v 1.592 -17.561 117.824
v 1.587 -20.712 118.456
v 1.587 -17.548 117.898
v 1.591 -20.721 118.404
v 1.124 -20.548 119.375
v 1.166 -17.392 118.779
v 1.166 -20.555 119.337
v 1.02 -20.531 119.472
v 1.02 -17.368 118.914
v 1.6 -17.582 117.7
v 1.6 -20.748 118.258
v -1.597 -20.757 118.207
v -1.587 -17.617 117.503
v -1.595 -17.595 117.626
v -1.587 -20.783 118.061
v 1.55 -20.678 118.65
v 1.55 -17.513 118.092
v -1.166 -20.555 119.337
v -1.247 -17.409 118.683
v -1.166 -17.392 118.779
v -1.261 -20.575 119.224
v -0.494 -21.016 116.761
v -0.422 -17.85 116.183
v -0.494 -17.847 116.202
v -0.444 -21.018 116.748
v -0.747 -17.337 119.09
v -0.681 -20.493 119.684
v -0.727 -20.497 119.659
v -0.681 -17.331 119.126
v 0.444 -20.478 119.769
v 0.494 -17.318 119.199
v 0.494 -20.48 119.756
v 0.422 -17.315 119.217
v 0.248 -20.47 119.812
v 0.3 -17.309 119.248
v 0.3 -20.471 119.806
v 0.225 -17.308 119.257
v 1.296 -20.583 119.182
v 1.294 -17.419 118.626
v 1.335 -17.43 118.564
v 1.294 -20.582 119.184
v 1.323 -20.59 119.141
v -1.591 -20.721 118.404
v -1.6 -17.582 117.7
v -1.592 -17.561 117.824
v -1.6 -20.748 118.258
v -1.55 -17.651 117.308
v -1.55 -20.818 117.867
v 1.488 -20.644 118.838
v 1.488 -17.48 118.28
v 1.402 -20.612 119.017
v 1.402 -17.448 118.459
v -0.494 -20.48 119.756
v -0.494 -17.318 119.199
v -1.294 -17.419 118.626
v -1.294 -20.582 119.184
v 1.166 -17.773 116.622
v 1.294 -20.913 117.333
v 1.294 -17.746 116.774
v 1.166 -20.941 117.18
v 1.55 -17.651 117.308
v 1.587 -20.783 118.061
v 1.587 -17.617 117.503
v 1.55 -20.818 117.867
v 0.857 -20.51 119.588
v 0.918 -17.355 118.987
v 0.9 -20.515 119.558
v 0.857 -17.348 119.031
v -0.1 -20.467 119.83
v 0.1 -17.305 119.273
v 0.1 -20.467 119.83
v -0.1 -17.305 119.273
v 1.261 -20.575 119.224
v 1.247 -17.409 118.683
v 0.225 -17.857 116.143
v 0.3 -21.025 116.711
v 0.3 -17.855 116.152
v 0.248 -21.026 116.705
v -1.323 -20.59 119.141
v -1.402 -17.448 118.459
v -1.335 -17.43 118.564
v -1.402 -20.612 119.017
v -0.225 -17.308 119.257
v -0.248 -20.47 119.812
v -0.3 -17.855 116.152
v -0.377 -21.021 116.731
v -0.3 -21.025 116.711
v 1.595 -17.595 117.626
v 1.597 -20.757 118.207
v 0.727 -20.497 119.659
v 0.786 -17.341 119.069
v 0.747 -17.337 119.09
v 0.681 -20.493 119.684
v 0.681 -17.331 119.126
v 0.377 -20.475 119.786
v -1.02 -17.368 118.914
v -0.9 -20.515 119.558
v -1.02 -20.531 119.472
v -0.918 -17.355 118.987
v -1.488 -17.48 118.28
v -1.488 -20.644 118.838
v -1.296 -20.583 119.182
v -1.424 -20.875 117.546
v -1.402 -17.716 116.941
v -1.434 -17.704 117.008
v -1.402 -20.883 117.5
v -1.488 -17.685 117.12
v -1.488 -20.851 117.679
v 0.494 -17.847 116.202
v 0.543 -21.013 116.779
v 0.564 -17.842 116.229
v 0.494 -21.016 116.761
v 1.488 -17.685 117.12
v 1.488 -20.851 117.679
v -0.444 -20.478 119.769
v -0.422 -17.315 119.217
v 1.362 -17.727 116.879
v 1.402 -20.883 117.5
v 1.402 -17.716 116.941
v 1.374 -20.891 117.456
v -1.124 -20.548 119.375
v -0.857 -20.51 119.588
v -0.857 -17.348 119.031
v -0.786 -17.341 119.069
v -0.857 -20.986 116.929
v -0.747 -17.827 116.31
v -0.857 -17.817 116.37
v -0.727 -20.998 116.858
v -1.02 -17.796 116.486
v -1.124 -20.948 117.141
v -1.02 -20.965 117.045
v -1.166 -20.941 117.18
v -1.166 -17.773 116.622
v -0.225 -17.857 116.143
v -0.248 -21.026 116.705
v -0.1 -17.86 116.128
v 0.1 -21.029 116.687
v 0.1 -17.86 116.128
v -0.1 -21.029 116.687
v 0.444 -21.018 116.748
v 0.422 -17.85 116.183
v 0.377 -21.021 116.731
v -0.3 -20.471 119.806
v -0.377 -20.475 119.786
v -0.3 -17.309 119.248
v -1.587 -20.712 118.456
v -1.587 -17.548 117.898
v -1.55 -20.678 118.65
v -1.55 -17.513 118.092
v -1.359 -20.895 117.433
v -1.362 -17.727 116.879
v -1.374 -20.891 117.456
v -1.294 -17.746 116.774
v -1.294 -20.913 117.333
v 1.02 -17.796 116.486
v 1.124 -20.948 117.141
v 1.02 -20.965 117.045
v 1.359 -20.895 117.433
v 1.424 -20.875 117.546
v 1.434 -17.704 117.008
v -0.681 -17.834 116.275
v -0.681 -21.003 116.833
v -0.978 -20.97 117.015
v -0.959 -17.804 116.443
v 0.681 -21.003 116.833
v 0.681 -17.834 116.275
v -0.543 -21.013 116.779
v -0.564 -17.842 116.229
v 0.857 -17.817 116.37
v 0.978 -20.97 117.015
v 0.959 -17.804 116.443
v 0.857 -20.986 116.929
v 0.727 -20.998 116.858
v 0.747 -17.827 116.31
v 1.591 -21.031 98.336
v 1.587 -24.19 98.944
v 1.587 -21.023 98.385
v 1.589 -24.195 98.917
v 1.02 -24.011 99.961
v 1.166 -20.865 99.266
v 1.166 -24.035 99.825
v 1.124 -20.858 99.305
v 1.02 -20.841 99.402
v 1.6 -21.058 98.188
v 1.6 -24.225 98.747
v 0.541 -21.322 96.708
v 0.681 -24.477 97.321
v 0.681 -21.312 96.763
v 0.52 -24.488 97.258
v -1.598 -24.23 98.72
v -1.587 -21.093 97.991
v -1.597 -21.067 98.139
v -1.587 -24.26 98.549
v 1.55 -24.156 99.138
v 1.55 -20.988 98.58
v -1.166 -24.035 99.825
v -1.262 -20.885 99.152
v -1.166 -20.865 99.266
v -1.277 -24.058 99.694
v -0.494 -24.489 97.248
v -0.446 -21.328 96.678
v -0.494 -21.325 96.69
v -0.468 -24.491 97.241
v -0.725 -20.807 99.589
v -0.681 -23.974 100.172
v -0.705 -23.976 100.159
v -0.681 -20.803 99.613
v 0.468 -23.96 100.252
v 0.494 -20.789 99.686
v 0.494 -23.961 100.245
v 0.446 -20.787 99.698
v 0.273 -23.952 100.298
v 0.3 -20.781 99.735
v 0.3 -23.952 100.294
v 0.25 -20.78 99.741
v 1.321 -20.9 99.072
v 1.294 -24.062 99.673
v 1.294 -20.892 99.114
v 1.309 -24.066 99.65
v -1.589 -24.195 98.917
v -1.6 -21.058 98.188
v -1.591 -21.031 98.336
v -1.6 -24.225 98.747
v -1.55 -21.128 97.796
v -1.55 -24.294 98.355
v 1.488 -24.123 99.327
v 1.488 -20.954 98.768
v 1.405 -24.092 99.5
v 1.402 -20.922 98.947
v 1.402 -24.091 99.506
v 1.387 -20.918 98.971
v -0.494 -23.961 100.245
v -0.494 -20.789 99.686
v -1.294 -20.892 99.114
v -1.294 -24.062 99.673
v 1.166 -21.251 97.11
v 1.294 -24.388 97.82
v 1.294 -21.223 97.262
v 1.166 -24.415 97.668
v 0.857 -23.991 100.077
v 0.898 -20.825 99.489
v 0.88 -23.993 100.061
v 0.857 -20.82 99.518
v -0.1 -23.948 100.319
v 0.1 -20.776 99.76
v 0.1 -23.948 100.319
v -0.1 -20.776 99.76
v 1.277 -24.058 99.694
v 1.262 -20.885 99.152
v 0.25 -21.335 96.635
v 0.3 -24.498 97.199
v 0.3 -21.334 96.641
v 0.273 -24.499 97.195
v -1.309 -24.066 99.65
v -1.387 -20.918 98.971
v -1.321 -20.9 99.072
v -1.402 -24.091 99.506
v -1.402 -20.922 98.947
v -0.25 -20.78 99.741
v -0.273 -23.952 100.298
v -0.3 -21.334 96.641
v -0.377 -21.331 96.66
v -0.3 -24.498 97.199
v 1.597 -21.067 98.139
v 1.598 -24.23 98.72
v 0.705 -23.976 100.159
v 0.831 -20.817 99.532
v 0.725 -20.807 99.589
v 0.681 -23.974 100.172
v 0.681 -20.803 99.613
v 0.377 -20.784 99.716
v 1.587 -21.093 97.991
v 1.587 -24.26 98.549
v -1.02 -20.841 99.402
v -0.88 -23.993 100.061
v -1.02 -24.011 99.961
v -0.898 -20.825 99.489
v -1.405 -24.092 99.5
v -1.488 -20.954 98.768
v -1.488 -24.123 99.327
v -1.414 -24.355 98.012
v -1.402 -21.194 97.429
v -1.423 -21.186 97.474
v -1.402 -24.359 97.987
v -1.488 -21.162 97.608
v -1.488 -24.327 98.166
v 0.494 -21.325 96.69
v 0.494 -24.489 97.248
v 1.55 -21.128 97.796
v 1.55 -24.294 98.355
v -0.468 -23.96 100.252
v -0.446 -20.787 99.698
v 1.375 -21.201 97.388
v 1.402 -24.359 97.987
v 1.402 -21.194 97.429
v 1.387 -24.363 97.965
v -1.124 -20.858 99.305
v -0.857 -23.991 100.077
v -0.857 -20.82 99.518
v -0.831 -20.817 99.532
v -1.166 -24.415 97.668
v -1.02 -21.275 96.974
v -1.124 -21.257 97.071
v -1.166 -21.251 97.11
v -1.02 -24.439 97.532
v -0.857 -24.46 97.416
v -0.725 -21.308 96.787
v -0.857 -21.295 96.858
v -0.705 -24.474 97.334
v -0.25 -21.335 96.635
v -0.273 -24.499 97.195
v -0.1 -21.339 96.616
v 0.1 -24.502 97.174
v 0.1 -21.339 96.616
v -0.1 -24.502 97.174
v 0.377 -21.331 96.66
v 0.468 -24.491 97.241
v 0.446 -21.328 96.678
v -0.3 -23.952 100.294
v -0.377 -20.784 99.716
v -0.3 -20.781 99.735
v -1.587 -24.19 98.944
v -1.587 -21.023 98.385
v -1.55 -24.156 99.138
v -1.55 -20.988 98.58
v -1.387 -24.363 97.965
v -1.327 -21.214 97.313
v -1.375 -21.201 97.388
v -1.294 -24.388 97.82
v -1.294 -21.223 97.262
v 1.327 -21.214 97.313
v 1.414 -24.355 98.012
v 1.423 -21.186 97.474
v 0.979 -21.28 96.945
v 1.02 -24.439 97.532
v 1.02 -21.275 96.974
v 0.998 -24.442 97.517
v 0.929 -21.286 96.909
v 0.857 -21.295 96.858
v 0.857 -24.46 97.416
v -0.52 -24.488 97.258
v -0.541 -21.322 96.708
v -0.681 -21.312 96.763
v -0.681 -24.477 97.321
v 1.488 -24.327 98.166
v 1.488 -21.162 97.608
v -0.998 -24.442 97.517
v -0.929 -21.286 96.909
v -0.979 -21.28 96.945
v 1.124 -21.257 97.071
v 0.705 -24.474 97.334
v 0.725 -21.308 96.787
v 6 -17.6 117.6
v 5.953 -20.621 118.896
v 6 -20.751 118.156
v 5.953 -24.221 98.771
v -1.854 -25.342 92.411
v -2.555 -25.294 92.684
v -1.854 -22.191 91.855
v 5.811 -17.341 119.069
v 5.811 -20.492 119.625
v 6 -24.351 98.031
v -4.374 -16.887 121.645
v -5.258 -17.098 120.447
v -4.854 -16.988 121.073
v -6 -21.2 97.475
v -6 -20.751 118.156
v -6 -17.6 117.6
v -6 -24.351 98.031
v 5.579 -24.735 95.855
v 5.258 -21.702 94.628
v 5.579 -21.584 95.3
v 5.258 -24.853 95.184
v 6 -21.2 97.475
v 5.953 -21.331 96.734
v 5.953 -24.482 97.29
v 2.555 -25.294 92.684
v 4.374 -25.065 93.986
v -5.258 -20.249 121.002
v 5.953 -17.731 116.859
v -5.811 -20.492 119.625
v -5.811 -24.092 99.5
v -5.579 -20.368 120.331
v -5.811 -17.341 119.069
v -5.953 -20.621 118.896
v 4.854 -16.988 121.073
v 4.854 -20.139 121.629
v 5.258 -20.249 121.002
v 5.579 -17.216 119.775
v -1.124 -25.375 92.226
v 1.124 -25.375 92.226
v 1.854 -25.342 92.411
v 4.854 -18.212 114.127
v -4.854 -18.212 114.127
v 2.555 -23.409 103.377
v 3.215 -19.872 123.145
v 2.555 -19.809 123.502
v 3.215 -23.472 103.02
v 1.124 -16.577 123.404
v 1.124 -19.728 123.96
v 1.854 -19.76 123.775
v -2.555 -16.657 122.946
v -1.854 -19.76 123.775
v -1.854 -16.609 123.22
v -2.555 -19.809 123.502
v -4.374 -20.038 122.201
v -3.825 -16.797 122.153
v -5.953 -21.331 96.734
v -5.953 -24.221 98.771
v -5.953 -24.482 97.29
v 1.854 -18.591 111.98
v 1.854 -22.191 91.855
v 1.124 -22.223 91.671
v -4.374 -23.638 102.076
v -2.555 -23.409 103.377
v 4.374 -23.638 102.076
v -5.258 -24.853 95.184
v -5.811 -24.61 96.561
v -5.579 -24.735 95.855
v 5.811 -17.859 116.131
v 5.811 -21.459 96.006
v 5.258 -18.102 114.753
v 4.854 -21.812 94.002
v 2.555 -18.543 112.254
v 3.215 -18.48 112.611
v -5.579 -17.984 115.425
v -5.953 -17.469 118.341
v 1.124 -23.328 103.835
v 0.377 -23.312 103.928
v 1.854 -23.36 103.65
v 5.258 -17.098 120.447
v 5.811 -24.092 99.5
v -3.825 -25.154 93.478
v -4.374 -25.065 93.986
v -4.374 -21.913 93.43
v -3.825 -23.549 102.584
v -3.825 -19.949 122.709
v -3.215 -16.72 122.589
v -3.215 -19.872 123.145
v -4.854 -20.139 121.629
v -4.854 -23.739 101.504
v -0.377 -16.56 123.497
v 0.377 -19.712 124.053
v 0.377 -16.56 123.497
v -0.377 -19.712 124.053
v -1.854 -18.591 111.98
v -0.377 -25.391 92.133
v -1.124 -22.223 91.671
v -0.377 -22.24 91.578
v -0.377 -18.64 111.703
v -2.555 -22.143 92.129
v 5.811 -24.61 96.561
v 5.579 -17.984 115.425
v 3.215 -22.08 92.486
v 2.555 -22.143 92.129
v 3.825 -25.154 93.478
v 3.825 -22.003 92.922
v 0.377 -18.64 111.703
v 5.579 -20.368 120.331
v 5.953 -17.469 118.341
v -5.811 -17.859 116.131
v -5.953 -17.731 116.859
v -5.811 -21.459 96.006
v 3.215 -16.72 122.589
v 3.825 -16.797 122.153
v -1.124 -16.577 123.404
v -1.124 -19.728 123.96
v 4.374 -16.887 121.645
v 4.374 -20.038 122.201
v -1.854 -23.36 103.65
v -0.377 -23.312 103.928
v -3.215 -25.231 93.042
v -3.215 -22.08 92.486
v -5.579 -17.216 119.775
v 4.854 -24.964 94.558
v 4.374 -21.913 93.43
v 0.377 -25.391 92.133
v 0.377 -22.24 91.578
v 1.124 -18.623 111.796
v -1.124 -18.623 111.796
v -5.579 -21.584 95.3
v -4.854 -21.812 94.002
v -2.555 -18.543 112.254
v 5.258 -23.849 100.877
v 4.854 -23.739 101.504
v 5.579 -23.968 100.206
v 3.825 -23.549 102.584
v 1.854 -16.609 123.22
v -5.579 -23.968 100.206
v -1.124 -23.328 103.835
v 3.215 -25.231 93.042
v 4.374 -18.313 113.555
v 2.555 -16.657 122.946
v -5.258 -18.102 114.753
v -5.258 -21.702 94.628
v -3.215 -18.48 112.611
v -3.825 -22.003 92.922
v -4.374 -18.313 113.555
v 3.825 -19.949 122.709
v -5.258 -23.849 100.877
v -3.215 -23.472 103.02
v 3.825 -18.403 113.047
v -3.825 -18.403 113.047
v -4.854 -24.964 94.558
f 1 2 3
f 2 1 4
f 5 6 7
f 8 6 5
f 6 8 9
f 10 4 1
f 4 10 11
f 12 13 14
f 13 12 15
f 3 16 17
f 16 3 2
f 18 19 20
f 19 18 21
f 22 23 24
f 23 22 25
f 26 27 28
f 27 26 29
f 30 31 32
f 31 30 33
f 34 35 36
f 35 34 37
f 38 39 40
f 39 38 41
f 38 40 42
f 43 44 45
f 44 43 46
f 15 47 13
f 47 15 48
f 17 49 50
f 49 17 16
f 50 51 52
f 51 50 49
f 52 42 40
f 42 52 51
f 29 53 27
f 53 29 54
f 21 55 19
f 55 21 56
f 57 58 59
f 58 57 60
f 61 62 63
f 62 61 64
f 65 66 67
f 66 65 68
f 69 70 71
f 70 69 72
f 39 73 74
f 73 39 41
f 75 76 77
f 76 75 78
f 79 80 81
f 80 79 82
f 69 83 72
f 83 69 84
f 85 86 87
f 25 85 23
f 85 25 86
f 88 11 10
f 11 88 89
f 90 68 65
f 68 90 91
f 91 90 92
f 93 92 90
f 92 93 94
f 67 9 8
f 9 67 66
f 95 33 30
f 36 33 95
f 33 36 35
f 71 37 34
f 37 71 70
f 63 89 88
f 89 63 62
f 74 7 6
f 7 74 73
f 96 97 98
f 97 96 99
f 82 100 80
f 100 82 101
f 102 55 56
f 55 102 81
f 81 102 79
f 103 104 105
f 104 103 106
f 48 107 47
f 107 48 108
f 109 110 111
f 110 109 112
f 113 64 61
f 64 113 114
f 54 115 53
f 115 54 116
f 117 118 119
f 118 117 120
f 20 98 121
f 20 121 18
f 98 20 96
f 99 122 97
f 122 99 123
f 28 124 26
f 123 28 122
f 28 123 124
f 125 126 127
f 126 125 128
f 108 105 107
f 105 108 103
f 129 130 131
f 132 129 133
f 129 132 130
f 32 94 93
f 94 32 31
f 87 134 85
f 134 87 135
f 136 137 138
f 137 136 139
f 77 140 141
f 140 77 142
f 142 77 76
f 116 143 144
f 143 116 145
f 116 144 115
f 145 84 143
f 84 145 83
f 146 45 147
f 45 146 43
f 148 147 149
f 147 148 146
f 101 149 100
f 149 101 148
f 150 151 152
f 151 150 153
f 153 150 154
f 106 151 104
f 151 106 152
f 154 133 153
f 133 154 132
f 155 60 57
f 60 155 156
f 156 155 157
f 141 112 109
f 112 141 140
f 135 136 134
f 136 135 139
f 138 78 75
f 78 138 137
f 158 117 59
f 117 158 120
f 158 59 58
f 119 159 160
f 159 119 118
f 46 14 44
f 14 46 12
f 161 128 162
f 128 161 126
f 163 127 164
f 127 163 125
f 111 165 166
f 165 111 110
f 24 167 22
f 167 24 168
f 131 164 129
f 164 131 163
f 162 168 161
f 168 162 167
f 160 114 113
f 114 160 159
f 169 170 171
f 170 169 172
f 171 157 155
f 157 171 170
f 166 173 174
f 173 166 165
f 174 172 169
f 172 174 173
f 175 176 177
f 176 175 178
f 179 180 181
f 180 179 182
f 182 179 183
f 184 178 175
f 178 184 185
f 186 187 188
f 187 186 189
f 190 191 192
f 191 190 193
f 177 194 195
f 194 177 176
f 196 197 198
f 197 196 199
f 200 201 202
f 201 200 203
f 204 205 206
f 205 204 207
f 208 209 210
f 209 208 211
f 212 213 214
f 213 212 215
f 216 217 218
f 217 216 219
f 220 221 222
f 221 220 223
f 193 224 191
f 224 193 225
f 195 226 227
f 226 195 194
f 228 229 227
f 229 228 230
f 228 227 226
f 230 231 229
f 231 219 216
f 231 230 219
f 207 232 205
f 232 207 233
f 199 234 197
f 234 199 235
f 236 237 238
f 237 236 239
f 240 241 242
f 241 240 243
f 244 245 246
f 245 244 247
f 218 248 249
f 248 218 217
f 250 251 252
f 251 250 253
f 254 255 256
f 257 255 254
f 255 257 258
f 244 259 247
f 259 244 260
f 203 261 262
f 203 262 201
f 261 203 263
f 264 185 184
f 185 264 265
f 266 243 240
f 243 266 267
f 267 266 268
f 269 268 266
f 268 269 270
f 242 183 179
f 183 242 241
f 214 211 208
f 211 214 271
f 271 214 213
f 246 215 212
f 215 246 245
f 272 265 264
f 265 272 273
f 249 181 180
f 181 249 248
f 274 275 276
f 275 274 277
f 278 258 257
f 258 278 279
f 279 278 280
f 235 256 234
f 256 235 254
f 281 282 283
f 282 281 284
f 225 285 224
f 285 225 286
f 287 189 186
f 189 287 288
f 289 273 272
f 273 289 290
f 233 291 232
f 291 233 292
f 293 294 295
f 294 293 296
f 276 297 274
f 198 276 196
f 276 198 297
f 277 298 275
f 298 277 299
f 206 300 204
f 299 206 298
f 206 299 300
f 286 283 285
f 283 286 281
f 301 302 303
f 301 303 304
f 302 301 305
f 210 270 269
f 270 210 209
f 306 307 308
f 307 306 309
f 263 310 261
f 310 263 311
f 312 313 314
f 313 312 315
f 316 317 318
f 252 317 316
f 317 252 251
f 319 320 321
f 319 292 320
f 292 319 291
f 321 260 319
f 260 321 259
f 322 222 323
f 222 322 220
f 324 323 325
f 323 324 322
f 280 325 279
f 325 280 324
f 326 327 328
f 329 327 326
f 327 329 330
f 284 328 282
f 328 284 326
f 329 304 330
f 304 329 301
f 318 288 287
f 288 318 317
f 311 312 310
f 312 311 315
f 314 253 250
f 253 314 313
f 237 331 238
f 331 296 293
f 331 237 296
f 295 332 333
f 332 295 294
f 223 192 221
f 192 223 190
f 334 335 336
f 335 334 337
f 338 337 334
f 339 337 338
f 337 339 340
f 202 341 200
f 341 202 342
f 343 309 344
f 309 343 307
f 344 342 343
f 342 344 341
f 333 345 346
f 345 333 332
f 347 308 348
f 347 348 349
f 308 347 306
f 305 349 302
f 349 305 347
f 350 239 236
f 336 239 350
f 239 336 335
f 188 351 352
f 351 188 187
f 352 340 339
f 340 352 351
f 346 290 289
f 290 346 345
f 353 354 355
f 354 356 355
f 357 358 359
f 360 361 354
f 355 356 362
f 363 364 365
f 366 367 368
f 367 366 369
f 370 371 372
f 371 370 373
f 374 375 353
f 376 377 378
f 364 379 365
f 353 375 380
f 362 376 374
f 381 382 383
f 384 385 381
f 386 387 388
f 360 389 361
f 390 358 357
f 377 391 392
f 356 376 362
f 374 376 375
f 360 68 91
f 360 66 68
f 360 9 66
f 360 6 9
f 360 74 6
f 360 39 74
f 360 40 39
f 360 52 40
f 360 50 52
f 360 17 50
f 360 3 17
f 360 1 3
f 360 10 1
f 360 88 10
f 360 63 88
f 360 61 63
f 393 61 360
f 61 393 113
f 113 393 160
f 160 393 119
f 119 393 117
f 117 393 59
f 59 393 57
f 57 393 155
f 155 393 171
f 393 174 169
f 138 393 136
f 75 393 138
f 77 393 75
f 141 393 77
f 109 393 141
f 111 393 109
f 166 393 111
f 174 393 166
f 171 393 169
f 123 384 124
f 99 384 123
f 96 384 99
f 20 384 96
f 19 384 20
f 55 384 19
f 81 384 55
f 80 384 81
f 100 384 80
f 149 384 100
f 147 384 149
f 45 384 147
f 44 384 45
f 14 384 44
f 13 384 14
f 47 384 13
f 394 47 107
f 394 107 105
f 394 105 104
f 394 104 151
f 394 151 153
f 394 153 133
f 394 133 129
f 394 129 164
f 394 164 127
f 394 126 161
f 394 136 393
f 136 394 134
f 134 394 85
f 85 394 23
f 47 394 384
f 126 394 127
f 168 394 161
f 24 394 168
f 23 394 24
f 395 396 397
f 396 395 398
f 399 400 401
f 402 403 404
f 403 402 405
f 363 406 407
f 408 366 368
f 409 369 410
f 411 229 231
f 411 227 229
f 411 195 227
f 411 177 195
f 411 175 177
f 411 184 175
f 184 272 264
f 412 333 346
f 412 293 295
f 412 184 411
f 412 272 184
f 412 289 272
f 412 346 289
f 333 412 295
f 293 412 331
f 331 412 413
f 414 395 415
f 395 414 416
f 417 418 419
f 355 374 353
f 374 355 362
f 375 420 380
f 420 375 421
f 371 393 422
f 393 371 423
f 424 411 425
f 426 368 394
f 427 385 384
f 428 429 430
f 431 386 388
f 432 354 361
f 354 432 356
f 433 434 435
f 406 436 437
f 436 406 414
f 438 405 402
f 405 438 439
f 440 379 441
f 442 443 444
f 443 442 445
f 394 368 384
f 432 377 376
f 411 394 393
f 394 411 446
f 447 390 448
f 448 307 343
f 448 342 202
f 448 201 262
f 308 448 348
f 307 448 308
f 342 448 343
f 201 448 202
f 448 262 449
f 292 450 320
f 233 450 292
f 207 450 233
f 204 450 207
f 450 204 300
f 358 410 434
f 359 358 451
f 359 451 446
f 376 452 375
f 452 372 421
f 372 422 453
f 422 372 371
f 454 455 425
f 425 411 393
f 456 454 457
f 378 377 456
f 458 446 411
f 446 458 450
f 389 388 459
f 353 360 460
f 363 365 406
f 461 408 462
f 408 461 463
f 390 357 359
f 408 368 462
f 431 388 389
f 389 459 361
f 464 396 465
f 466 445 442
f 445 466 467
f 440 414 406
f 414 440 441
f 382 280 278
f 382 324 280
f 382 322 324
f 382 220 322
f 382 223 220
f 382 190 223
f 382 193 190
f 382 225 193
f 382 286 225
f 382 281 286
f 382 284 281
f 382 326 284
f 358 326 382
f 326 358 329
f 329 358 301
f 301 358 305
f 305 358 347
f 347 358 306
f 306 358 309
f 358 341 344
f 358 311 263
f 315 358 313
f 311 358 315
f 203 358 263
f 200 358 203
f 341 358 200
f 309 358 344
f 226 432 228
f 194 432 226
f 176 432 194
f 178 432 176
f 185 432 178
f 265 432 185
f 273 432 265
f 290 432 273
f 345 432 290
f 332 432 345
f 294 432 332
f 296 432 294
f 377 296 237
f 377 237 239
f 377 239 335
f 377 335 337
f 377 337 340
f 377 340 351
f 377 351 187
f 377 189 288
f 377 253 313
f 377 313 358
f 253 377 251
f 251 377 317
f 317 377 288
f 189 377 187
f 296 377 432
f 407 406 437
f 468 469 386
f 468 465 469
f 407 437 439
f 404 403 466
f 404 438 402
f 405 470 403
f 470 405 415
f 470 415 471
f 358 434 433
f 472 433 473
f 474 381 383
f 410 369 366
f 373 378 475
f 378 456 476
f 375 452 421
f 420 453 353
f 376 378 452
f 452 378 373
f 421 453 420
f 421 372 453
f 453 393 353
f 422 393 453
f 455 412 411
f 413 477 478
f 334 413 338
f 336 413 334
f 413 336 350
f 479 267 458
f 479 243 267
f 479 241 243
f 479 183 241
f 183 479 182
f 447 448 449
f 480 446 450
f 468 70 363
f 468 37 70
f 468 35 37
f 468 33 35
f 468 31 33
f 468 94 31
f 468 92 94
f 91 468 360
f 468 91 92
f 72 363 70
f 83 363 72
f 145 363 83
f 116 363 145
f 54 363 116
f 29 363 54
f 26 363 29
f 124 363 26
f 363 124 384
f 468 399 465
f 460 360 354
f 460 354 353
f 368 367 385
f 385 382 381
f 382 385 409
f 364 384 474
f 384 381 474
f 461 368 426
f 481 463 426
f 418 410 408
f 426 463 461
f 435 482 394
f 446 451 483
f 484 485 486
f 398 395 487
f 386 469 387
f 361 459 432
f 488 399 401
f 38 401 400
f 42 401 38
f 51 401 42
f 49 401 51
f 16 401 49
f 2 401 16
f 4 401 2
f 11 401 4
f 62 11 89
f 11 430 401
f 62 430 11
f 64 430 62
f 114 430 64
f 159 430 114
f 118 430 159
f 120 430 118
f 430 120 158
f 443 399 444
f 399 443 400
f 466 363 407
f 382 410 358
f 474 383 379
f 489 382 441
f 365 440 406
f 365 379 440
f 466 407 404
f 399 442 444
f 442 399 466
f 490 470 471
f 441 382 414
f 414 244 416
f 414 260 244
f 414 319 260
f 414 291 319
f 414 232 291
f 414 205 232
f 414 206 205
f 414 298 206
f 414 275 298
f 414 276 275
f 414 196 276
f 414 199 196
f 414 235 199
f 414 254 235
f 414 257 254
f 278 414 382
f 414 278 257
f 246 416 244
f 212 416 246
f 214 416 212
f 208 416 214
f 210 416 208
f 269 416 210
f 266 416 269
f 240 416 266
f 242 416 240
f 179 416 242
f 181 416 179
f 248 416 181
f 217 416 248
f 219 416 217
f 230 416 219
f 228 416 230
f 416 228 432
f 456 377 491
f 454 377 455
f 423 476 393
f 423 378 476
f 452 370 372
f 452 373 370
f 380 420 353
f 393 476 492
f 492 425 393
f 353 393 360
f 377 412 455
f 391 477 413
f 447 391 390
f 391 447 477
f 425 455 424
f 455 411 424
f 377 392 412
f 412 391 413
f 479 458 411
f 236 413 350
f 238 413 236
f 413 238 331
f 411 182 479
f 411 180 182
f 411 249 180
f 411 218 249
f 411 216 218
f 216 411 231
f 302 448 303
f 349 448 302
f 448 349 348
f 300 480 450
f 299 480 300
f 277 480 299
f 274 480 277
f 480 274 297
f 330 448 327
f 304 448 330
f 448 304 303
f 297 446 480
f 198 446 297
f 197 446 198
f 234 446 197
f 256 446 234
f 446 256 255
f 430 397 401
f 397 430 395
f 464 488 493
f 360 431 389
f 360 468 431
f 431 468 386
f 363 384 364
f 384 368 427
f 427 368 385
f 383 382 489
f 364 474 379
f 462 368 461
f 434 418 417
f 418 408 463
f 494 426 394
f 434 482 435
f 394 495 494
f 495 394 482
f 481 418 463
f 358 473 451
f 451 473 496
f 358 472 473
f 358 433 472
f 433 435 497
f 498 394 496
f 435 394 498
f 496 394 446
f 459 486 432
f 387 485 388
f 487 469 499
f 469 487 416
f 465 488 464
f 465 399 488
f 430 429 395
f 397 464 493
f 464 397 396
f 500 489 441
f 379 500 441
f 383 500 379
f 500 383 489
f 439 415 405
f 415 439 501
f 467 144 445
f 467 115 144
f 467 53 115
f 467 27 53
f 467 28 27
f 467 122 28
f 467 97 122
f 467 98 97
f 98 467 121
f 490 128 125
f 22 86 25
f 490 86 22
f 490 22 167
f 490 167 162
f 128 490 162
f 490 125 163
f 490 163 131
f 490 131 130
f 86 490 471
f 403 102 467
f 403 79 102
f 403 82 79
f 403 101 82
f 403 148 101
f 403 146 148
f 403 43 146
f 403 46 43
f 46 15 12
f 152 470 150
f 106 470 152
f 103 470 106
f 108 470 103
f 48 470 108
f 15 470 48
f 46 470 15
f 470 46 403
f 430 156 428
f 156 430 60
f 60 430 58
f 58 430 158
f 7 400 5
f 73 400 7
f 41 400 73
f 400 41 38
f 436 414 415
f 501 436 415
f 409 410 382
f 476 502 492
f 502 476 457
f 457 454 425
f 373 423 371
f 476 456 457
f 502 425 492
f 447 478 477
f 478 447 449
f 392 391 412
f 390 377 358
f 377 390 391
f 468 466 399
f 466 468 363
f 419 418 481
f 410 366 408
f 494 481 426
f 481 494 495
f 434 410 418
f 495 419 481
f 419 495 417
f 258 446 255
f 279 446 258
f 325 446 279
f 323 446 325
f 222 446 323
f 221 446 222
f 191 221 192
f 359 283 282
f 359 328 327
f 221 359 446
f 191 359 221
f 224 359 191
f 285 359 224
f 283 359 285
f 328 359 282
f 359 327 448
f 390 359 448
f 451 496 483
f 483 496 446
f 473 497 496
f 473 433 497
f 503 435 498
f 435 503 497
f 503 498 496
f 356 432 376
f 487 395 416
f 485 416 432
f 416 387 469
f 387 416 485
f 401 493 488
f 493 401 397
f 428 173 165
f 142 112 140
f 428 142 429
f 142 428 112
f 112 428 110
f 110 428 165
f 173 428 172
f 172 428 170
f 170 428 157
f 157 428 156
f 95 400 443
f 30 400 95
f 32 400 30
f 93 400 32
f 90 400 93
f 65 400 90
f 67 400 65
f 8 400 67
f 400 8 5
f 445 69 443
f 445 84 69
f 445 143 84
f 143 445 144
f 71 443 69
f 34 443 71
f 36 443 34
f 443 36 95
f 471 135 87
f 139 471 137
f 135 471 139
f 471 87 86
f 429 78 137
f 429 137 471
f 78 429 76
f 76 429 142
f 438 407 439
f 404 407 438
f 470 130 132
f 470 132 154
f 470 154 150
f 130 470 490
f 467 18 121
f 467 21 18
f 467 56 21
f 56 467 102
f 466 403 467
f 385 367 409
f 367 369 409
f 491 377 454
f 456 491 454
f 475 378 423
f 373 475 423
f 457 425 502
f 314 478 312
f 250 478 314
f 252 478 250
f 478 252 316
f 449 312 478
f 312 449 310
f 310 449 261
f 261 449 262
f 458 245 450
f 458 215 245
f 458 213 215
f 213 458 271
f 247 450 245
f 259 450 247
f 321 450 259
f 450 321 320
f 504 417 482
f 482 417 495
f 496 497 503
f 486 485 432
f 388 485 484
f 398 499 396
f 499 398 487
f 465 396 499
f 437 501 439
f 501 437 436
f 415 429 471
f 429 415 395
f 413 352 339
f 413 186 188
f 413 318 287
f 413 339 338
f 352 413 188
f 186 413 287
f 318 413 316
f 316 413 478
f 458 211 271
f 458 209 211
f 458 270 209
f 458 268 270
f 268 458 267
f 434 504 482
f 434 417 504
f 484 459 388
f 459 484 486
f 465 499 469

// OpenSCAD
// vim:ts=4:sw=4:sts=4:et:ai:si:fdm=marker
//
// Make the varla stone holey and add a square hole to the top through which we'll ram a 10x10mm
// square alu tube for LED mounting, cooling and cable housing.
//
// Written by Roy Sigurd Karlsbakk <roy@karlsbakk.net> in August 2025.
//

// Functions
function b2i(b) = b ? 1 : 0;

// Variables
holey = true;

frame_filename = "varla_frame_bottom-r2.obj";
stone_filename = "varla_stone_bottom.obj";

alutubedim = holey ? [10.5,10.5,200] : [0,0,0];
krymp = [.97,.97,.97];

draw_stone_bottom = false;
draw_frame_bottom = true;
draw_stone_top = false;
draw_frame_top = false;

stone_top_d = 28.5;
stone_top_mid_d = 40.5;
stone_bottom_mid_d = 66.5;
stone_bottom_d = 82.5;

stone_top_h = 130.25;
stone_top_mid_h = 90.0;
stone_bottom_mid_h = 28.75;
stone_screw1_z = stone_top_h - (stone_top_h - stone_top_mid_h) / 4;
stone_screw2_z = stone_top_h - (stone_top_h - stone_top_mid_h) / 4 * 3;

frame_top_h = holey ? 163.2 : 165.7;
frame_screw1_z = 114.6;
frame_screw2_z = frame_screw1_z - (stone_screw1_z - stone_screw2_z);
frame_hole_rot = 80;

screwplate_d = 12;
screwplate_th = 3.2;
screw_d = 3.2;

plug_h = 30;

thickness = 1;

bugfix = $preview ? .1 : 0;

debug = true;

// Sanity check
draw_count = b2i(draw_stone_bottom) + b2i(draw_frame_bottom) + b2i(draw_stone_top) + b2i(draw_frame_top);
assert(draw_count == 1, str("draw count is ", draw_count, " and it should be 1"));

// Debug
if (debug) {
    echo(str("DEBUG: stone_top_h is ", stone_top_h, ", stone_top_mid_h is ", stone_top_mid_h,
             ", stone_screw1_z is ", stone_screw1_z, " and stone_screw2_z is ", stone_screw2_z,
             ", frame_screw1_z is ", frame_screw1_z, " and frame_screw2_z is ", frame_screw2_z));
}

// Square tube
module square_tube(dim = alutubedim) {
    translate([-dim[0]/2,-dim[1]/2,0]) {
        cube(dim);
    }
}

// Stone first
module stone() {
    difference() {
        import(stone_filename);

        translate([0,0,-bugfix]) {
            scale(krymp) {
                translate([0,0,-5]) {
                    import(stone_filename);
                }
            }
        }
    }

    translate([0,0,stone_top_mid_h]) {
        color("red") {
            cylinder(d1=stone_top_mid_d, d2=stone_top_d, h=stone_top_h-stone_top_mid_h);
        }
    }
}

module holey_stone(screws = true) {
    difference() {
        stone();

        square_tube();

        // Screw holes
        if (screws) {
            translate([0, 0, stone_screw1_z]) {
                rotate([frame_hole_rot,0,0]) {
                    cylinder(d = screw_d, h = stone_top_d, $fn = 50);
                }
            }
            translate([0, 0, stone_screw2_z]) {
                rotate([frame_hole_rot,0,0]) {
                    cylinder(d = screw_d, h = stone_top_d, $fn = 50);
                }
            }
        }
    }
}

module frame() {
    import(frame_filename);
}

module holey_frame(screws = true) {
    difference() {
        union() {
            frame();
            hull() {
                translate([0, -17.6, frame_screw1_z+3]) {
                    rotate([frame_hole_rot,0,0]) {
                        cylinder(d = screwplate_d, h = screwplate_th, $fn = 50);
                    }
                }
                translate([0, -21.2, frame_screw2_z+3]) {
                    rotate([frame_hole_rot,0,0]) {
                        cylinder(d = screwplate_d, h = screwplate_th, $fn = 50);
                    }
                }
            }
        }
        square_tube();

        // Screw holes
        if (screws) {
            translate([0, 0, frame_screw1_z]) {
                rotate([frame_hole_rot,0,0]) {
                    cylinder(d = screw_d, h = stone_top_d, $fn = 50);
                }
            }
            translate([0, 0, frame_screw2_z]) {
                rotate([frame_hole_rot,0,0]) {
                    cylinder(d = screw_d, h = stone_top_d, $fn = 50);
                }
            }
        }
    }
}

if (draw_stone_bottom) {
    if (holey) {
        holey_stone();
    } else {
        stone();
    }
}

if (draw_frame_bottom) {
    if (holey) {
        holey_frame();
    } else {
        frame();
    }
}
